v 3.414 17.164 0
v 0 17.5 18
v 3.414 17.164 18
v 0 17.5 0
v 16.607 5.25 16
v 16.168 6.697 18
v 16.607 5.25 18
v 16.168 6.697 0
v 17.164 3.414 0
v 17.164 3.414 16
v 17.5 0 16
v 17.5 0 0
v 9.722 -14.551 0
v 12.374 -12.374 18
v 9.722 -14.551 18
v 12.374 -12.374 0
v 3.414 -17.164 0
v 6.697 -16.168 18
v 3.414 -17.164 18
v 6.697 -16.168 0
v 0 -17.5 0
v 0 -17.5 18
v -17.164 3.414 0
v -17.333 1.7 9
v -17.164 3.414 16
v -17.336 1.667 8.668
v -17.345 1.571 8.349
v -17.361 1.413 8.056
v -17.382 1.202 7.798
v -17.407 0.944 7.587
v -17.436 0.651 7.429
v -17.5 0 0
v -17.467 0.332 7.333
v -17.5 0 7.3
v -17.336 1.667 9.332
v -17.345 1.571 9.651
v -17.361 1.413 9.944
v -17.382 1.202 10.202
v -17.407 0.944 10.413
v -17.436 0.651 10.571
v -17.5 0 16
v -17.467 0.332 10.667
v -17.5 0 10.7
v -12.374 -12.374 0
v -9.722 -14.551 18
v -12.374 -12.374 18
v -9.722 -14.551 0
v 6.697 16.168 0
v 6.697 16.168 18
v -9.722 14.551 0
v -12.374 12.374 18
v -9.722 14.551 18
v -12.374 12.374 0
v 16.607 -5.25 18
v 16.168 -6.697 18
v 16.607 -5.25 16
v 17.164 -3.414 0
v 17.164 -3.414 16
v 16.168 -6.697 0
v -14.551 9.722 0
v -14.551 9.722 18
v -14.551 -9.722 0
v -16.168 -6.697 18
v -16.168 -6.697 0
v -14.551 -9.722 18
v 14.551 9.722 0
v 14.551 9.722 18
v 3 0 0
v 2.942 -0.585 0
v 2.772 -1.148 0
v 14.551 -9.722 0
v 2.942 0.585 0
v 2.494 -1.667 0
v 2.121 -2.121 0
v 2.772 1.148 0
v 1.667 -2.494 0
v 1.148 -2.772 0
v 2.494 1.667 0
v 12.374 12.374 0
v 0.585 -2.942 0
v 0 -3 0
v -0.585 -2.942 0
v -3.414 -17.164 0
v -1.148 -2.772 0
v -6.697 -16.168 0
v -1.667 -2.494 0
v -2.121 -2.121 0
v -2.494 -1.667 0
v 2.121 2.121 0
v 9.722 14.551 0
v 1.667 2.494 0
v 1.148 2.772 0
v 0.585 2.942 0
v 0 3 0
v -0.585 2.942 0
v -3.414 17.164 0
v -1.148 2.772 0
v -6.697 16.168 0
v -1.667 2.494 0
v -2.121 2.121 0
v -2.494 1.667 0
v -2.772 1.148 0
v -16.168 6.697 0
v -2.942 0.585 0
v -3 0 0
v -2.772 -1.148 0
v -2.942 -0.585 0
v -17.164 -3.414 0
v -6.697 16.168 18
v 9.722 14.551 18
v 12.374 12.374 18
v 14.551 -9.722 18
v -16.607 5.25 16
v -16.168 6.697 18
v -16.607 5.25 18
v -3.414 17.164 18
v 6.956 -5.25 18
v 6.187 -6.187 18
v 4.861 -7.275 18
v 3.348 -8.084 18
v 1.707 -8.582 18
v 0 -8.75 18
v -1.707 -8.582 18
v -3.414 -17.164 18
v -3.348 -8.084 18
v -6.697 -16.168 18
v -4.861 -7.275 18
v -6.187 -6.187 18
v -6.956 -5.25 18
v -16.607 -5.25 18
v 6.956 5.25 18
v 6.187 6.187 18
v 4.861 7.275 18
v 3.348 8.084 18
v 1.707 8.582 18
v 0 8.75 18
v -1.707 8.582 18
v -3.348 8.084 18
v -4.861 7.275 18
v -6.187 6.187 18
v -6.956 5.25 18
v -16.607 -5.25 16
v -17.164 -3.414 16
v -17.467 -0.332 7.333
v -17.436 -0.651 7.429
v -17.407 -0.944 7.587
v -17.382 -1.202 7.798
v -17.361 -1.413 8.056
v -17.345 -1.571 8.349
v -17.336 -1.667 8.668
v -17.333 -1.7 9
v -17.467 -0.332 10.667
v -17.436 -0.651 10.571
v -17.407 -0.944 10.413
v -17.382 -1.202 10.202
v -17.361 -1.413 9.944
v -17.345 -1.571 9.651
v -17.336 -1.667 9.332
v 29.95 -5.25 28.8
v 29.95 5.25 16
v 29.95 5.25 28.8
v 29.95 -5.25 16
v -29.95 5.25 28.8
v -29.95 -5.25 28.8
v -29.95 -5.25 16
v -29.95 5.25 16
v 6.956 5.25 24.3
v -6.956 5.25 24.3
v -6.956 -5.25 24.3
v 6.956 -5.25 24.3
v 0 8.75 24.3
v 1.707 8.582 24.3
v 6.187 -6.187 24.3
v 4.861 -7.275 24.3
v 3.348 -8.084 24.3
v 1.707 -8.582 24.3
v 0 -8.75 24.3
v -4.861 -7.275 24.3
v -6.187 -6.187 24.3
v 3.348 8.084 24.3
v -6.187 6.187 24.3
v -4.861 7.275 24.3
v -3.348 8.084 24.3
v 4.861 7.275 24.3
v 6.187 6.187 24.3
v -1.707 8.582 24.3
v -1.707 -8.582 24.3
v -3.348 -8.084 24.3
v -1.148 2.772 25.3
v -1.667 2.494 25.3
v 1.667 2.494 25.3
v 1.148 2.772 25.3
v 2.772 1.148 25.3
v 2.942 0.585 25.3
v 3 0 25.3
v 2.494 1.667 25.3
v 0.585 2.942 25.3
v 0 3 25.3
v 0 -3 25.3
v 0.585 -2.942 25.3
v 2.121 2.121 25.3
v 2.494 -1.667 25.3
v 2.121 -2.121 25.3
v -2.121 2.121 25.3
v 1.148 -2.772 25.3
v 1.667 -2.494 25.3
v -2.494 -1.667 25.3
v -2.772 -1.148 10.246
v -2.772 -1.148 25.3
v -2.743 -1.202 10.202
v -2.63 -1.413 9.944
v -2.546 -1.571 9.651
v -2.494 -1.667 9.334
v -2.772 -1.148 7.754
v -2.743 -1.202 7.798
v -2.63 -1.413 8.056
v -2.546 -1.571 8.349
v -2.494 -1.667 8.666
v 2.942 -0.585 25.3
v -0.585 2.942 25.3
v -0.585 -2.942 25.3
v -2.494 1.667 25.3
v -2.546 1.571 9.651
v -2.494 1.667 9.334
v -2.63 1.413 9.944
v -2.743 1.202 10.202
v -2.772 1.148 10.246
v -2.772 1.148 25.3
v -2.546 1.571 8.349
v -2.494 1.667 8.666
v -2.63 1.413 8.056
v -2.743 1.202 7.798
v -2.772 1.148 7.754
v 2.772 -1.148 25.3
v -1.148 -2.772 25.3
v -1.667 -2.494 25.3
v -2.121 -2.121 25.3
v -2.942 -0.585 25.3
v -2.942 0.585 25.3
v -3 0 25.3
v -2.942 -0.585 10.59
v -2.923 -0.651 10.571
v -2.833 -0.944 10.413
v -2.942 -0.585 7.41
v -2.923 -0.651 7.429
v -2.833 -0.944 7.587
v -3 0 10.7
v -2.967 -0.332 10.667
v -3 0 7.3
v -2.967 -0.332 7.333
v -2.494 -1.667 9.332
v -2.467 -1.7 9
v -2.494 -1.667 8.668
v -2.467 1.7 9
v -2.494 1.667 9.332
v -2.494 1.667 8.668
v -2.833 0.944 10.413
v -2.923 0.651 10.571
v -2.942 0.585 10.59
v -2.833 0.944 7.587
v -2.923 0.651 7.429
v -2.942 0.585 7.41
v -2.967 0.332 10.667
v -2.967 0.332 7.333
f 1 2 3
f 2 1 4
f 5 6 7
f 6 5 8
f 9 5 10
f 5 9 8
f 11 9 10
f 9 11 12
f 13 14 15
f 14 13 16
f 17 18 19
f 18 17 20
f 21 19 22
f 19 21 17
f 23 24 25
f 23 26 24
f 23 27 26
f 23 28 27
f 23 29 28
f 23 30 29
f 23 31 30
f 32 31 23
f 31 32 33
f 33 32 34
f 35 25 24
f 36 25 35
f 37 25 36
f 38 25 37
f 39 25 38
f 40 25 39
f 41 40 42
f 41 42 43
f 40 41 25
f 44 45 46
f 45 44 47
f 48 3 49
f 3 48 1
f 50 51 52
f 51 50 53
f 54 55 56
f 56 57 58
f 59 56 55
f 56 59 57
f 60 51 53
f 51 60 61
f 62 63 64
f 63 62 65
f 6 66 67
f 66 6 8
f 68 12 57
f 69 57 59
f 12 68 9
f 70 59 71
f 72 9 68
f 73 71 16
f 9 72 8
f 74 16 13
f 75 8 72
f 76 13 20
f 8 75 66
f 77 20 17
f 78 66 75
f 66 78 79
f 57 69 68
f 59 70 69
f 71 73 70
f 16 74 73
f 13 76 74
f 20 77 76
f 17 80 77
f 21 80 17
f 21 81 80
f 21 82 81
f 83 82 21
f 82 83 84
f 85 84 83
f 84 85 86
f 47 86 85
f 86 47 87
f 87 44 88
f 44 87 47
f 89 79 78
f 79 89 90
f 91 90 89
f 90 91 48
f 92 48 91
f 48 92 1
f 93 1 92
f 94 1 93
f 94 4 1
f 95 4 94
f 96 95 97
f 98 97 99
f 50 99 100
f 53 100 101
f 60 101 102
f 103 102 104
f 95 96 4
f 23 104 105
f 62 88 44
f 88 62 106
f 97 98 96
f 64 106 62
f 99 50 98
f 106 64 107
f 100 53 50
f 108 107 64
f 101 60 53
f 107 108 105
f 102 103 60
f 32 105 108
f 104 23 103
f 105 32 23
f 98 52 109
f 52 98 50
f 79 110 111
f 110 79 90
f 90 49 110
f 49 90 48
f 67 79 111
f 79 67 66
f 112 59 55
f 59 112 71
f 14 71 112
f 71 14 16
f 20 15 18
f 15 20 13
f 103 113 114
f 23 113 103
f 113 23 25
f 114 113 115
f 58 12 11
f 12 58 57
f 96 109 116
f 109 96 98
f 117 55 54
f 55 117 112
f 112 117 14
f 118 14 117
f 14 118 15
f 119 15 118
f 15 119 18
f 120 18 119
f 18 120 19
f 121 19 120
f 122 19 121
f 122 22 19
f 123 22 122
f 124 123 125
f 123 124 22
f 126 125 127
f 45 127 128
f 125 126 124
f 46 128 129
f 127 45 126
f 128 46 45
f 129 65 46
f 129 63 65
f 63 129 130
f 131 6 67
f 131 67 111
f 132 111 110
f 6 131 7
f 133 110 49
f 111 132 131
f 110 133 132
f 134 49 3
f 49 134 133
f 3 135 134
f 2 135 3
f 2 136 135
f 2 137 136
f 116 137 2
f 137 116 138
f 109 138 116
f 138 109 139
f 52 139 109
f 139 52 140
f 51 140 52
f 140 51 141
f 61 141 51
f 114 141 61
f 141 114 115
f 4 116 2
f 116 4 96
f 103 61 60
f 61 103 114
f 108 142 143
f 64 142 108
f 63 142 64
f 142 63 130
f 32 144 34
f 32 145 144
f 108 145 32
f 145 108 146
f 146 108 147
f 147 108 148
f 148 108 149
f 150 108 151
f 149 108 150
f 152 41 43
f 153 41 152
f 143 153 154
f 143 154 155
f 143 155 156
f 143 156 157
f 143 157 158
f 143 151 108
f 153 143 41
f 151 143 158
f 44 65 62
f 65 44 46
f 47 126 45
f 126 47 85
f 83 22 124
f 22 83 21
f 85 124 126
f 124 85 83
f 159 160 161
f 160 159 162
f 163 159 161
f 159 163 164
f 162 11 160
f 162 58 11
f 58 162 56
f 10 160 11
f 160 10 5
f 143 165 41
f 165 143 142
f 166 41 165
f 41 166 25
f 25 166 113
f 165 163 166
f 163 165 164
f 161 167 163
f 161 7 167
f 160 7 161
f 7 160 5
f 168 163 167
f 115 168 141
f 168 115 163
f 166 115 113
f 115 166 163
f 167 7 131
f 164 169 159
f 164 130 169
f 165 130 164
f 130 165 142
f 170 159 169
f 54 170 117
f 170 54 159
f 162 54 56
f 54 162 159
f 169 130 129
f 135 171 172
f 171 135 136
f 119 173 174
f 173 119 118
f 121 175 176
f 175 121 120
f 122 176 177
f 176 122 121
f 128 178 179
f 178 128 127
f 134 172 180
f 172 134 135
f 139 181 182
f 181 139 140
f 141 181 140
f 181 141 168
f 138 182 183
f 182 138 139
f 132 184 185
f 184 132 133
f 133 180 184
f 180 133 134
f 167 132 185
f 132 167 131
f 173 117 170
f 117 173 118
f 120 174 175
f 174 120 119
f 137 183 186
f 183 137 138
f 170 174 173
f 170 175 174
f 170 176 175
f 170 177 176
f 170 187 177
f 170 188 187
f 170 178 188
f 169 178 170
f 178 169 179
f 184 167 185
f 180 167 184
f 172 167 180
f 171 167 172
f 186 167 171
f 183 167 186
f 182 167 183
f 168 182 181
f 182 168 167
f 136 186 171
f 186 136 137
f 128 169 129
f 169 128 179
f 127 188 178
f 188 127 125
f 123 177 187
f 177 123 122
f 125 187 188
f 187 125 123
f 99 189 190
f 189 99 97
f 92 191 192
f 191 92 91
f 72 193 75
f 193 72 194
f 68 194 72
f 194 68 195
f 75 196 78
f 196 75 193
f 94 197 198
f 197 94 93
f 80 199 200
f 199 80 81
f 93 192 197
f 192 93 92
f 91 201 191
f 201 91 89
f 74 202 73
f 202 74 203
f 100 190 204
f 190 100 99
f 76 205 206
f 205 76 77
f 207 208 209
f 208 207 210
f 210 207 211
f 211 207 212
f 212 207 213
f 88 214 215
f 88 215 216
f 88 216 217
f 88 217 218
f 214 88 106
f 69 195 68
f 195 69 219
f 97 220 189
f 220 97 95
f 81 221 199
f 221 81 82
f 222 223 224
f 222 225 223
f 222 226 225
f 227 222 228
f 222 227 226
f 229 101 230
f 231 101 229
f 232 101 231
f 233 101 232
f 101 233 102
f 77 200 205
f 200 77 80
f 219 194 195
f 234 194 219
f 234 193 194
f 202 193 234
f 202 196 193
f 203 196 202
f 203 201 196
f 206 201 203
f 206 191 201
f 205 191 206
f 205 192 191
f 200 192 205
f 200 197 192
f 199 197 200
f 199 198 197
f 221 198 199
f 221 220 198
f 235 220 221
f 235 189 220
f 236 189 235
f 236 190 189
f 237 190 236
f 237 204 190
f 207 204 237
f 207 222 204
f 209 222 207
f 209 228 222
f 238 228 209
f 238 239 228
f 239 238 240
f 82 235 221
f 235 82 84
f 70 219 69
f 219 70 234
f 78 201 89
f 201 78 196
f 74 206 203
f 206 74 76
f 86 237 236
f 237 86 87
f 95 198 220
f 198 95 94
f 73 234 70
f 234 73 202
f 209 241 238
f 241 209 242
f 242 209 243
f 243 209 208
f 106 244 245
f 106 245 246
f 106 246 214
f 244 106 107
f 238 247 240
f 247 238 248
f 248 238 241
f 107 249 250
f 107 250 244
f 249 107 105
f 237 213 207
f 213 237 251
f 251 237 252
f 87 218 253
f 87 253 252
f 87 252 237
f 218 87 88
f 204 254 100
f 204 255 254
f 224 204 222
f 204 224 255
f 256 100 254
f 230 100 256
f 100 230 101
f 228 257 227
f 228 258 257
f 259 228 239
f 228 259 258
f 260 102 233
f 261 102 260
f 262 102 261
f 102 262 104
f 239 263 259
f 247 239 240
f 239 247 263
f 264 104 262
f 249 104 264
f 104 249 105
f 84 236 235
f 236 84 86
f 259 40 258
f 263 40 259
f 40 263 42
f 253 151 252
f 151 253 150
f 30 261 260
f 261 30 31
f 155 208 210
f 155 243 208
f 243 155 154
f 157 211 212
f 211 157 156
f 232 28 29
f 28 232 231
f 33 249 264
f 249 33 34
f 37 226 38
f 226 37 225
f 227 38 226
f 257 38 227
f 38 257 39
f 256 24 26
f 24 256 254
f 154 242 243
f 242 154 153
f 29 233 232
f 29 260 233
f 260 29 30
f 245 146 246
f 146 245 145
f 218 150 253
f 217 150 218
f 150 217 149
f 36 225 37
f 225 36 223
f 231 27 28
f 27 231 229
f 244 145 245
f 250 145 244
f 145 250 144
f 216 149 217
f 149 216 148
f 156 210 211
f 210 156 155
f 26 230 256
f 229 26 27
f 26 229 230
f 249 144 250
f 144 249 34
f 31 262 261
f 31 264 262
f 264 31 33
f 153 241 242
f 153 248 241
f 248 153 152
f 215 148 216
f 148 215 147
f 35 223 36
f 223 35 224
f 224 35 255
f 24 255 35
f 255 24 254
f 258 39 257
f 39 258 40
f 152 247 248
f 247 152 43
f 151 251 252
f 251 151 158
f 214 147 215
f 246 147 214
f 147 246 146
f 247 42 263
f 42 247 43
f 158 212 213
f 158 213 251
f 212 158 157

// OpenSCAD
$fn = 32;

// ----------------------------------------------------------------------
// Hand knob: 35 x 59.9 x 24.3 mm
// ----------------------------------------------------------------------

// --- parameters (mm) ---
grip_d = 35;              // knob diameter
grip_h = 18;              // knob height
shaft_d = 6;              // shaft bore
set_d = 3.4;              // set screw tap hole
wing_l = 59.9;            // wing span
wing_w = 10.5;            // wing width
wing_h = 10.8;            // wing thickness
cap_h = 6.3;              // raised centre cap
cap_d = 17.5;             // centre cap diameter

module body() {
  cylinder(h = grip_h, d = grip_d);
}

module wing() {
  /* wing sunk 2 mm into the knob so the joint overlaps */
  translate([-wing_l / 2, -wing_w / 2, grip_h - 2])
    cube([wing_l, wing_w, wing_h + 2]);
}

module cap() {
  translate([0, 0, grip_h - 1]) cylinder(h = cap_h + 1, d = cap_d);
}

difference() {
  union() {
    body();
    wing();
    cap();
  }
  translate([0, 0, -1]) cylinder(h = grip_h + cap_h + 2, d = shaft_d);
  translate([-grip_d / 2 - 1, 0, grip_h * 0.5]) rotate([0, 90, 0]) cylinder(h = grip_d / 2 + 2, d = set_d);
}
